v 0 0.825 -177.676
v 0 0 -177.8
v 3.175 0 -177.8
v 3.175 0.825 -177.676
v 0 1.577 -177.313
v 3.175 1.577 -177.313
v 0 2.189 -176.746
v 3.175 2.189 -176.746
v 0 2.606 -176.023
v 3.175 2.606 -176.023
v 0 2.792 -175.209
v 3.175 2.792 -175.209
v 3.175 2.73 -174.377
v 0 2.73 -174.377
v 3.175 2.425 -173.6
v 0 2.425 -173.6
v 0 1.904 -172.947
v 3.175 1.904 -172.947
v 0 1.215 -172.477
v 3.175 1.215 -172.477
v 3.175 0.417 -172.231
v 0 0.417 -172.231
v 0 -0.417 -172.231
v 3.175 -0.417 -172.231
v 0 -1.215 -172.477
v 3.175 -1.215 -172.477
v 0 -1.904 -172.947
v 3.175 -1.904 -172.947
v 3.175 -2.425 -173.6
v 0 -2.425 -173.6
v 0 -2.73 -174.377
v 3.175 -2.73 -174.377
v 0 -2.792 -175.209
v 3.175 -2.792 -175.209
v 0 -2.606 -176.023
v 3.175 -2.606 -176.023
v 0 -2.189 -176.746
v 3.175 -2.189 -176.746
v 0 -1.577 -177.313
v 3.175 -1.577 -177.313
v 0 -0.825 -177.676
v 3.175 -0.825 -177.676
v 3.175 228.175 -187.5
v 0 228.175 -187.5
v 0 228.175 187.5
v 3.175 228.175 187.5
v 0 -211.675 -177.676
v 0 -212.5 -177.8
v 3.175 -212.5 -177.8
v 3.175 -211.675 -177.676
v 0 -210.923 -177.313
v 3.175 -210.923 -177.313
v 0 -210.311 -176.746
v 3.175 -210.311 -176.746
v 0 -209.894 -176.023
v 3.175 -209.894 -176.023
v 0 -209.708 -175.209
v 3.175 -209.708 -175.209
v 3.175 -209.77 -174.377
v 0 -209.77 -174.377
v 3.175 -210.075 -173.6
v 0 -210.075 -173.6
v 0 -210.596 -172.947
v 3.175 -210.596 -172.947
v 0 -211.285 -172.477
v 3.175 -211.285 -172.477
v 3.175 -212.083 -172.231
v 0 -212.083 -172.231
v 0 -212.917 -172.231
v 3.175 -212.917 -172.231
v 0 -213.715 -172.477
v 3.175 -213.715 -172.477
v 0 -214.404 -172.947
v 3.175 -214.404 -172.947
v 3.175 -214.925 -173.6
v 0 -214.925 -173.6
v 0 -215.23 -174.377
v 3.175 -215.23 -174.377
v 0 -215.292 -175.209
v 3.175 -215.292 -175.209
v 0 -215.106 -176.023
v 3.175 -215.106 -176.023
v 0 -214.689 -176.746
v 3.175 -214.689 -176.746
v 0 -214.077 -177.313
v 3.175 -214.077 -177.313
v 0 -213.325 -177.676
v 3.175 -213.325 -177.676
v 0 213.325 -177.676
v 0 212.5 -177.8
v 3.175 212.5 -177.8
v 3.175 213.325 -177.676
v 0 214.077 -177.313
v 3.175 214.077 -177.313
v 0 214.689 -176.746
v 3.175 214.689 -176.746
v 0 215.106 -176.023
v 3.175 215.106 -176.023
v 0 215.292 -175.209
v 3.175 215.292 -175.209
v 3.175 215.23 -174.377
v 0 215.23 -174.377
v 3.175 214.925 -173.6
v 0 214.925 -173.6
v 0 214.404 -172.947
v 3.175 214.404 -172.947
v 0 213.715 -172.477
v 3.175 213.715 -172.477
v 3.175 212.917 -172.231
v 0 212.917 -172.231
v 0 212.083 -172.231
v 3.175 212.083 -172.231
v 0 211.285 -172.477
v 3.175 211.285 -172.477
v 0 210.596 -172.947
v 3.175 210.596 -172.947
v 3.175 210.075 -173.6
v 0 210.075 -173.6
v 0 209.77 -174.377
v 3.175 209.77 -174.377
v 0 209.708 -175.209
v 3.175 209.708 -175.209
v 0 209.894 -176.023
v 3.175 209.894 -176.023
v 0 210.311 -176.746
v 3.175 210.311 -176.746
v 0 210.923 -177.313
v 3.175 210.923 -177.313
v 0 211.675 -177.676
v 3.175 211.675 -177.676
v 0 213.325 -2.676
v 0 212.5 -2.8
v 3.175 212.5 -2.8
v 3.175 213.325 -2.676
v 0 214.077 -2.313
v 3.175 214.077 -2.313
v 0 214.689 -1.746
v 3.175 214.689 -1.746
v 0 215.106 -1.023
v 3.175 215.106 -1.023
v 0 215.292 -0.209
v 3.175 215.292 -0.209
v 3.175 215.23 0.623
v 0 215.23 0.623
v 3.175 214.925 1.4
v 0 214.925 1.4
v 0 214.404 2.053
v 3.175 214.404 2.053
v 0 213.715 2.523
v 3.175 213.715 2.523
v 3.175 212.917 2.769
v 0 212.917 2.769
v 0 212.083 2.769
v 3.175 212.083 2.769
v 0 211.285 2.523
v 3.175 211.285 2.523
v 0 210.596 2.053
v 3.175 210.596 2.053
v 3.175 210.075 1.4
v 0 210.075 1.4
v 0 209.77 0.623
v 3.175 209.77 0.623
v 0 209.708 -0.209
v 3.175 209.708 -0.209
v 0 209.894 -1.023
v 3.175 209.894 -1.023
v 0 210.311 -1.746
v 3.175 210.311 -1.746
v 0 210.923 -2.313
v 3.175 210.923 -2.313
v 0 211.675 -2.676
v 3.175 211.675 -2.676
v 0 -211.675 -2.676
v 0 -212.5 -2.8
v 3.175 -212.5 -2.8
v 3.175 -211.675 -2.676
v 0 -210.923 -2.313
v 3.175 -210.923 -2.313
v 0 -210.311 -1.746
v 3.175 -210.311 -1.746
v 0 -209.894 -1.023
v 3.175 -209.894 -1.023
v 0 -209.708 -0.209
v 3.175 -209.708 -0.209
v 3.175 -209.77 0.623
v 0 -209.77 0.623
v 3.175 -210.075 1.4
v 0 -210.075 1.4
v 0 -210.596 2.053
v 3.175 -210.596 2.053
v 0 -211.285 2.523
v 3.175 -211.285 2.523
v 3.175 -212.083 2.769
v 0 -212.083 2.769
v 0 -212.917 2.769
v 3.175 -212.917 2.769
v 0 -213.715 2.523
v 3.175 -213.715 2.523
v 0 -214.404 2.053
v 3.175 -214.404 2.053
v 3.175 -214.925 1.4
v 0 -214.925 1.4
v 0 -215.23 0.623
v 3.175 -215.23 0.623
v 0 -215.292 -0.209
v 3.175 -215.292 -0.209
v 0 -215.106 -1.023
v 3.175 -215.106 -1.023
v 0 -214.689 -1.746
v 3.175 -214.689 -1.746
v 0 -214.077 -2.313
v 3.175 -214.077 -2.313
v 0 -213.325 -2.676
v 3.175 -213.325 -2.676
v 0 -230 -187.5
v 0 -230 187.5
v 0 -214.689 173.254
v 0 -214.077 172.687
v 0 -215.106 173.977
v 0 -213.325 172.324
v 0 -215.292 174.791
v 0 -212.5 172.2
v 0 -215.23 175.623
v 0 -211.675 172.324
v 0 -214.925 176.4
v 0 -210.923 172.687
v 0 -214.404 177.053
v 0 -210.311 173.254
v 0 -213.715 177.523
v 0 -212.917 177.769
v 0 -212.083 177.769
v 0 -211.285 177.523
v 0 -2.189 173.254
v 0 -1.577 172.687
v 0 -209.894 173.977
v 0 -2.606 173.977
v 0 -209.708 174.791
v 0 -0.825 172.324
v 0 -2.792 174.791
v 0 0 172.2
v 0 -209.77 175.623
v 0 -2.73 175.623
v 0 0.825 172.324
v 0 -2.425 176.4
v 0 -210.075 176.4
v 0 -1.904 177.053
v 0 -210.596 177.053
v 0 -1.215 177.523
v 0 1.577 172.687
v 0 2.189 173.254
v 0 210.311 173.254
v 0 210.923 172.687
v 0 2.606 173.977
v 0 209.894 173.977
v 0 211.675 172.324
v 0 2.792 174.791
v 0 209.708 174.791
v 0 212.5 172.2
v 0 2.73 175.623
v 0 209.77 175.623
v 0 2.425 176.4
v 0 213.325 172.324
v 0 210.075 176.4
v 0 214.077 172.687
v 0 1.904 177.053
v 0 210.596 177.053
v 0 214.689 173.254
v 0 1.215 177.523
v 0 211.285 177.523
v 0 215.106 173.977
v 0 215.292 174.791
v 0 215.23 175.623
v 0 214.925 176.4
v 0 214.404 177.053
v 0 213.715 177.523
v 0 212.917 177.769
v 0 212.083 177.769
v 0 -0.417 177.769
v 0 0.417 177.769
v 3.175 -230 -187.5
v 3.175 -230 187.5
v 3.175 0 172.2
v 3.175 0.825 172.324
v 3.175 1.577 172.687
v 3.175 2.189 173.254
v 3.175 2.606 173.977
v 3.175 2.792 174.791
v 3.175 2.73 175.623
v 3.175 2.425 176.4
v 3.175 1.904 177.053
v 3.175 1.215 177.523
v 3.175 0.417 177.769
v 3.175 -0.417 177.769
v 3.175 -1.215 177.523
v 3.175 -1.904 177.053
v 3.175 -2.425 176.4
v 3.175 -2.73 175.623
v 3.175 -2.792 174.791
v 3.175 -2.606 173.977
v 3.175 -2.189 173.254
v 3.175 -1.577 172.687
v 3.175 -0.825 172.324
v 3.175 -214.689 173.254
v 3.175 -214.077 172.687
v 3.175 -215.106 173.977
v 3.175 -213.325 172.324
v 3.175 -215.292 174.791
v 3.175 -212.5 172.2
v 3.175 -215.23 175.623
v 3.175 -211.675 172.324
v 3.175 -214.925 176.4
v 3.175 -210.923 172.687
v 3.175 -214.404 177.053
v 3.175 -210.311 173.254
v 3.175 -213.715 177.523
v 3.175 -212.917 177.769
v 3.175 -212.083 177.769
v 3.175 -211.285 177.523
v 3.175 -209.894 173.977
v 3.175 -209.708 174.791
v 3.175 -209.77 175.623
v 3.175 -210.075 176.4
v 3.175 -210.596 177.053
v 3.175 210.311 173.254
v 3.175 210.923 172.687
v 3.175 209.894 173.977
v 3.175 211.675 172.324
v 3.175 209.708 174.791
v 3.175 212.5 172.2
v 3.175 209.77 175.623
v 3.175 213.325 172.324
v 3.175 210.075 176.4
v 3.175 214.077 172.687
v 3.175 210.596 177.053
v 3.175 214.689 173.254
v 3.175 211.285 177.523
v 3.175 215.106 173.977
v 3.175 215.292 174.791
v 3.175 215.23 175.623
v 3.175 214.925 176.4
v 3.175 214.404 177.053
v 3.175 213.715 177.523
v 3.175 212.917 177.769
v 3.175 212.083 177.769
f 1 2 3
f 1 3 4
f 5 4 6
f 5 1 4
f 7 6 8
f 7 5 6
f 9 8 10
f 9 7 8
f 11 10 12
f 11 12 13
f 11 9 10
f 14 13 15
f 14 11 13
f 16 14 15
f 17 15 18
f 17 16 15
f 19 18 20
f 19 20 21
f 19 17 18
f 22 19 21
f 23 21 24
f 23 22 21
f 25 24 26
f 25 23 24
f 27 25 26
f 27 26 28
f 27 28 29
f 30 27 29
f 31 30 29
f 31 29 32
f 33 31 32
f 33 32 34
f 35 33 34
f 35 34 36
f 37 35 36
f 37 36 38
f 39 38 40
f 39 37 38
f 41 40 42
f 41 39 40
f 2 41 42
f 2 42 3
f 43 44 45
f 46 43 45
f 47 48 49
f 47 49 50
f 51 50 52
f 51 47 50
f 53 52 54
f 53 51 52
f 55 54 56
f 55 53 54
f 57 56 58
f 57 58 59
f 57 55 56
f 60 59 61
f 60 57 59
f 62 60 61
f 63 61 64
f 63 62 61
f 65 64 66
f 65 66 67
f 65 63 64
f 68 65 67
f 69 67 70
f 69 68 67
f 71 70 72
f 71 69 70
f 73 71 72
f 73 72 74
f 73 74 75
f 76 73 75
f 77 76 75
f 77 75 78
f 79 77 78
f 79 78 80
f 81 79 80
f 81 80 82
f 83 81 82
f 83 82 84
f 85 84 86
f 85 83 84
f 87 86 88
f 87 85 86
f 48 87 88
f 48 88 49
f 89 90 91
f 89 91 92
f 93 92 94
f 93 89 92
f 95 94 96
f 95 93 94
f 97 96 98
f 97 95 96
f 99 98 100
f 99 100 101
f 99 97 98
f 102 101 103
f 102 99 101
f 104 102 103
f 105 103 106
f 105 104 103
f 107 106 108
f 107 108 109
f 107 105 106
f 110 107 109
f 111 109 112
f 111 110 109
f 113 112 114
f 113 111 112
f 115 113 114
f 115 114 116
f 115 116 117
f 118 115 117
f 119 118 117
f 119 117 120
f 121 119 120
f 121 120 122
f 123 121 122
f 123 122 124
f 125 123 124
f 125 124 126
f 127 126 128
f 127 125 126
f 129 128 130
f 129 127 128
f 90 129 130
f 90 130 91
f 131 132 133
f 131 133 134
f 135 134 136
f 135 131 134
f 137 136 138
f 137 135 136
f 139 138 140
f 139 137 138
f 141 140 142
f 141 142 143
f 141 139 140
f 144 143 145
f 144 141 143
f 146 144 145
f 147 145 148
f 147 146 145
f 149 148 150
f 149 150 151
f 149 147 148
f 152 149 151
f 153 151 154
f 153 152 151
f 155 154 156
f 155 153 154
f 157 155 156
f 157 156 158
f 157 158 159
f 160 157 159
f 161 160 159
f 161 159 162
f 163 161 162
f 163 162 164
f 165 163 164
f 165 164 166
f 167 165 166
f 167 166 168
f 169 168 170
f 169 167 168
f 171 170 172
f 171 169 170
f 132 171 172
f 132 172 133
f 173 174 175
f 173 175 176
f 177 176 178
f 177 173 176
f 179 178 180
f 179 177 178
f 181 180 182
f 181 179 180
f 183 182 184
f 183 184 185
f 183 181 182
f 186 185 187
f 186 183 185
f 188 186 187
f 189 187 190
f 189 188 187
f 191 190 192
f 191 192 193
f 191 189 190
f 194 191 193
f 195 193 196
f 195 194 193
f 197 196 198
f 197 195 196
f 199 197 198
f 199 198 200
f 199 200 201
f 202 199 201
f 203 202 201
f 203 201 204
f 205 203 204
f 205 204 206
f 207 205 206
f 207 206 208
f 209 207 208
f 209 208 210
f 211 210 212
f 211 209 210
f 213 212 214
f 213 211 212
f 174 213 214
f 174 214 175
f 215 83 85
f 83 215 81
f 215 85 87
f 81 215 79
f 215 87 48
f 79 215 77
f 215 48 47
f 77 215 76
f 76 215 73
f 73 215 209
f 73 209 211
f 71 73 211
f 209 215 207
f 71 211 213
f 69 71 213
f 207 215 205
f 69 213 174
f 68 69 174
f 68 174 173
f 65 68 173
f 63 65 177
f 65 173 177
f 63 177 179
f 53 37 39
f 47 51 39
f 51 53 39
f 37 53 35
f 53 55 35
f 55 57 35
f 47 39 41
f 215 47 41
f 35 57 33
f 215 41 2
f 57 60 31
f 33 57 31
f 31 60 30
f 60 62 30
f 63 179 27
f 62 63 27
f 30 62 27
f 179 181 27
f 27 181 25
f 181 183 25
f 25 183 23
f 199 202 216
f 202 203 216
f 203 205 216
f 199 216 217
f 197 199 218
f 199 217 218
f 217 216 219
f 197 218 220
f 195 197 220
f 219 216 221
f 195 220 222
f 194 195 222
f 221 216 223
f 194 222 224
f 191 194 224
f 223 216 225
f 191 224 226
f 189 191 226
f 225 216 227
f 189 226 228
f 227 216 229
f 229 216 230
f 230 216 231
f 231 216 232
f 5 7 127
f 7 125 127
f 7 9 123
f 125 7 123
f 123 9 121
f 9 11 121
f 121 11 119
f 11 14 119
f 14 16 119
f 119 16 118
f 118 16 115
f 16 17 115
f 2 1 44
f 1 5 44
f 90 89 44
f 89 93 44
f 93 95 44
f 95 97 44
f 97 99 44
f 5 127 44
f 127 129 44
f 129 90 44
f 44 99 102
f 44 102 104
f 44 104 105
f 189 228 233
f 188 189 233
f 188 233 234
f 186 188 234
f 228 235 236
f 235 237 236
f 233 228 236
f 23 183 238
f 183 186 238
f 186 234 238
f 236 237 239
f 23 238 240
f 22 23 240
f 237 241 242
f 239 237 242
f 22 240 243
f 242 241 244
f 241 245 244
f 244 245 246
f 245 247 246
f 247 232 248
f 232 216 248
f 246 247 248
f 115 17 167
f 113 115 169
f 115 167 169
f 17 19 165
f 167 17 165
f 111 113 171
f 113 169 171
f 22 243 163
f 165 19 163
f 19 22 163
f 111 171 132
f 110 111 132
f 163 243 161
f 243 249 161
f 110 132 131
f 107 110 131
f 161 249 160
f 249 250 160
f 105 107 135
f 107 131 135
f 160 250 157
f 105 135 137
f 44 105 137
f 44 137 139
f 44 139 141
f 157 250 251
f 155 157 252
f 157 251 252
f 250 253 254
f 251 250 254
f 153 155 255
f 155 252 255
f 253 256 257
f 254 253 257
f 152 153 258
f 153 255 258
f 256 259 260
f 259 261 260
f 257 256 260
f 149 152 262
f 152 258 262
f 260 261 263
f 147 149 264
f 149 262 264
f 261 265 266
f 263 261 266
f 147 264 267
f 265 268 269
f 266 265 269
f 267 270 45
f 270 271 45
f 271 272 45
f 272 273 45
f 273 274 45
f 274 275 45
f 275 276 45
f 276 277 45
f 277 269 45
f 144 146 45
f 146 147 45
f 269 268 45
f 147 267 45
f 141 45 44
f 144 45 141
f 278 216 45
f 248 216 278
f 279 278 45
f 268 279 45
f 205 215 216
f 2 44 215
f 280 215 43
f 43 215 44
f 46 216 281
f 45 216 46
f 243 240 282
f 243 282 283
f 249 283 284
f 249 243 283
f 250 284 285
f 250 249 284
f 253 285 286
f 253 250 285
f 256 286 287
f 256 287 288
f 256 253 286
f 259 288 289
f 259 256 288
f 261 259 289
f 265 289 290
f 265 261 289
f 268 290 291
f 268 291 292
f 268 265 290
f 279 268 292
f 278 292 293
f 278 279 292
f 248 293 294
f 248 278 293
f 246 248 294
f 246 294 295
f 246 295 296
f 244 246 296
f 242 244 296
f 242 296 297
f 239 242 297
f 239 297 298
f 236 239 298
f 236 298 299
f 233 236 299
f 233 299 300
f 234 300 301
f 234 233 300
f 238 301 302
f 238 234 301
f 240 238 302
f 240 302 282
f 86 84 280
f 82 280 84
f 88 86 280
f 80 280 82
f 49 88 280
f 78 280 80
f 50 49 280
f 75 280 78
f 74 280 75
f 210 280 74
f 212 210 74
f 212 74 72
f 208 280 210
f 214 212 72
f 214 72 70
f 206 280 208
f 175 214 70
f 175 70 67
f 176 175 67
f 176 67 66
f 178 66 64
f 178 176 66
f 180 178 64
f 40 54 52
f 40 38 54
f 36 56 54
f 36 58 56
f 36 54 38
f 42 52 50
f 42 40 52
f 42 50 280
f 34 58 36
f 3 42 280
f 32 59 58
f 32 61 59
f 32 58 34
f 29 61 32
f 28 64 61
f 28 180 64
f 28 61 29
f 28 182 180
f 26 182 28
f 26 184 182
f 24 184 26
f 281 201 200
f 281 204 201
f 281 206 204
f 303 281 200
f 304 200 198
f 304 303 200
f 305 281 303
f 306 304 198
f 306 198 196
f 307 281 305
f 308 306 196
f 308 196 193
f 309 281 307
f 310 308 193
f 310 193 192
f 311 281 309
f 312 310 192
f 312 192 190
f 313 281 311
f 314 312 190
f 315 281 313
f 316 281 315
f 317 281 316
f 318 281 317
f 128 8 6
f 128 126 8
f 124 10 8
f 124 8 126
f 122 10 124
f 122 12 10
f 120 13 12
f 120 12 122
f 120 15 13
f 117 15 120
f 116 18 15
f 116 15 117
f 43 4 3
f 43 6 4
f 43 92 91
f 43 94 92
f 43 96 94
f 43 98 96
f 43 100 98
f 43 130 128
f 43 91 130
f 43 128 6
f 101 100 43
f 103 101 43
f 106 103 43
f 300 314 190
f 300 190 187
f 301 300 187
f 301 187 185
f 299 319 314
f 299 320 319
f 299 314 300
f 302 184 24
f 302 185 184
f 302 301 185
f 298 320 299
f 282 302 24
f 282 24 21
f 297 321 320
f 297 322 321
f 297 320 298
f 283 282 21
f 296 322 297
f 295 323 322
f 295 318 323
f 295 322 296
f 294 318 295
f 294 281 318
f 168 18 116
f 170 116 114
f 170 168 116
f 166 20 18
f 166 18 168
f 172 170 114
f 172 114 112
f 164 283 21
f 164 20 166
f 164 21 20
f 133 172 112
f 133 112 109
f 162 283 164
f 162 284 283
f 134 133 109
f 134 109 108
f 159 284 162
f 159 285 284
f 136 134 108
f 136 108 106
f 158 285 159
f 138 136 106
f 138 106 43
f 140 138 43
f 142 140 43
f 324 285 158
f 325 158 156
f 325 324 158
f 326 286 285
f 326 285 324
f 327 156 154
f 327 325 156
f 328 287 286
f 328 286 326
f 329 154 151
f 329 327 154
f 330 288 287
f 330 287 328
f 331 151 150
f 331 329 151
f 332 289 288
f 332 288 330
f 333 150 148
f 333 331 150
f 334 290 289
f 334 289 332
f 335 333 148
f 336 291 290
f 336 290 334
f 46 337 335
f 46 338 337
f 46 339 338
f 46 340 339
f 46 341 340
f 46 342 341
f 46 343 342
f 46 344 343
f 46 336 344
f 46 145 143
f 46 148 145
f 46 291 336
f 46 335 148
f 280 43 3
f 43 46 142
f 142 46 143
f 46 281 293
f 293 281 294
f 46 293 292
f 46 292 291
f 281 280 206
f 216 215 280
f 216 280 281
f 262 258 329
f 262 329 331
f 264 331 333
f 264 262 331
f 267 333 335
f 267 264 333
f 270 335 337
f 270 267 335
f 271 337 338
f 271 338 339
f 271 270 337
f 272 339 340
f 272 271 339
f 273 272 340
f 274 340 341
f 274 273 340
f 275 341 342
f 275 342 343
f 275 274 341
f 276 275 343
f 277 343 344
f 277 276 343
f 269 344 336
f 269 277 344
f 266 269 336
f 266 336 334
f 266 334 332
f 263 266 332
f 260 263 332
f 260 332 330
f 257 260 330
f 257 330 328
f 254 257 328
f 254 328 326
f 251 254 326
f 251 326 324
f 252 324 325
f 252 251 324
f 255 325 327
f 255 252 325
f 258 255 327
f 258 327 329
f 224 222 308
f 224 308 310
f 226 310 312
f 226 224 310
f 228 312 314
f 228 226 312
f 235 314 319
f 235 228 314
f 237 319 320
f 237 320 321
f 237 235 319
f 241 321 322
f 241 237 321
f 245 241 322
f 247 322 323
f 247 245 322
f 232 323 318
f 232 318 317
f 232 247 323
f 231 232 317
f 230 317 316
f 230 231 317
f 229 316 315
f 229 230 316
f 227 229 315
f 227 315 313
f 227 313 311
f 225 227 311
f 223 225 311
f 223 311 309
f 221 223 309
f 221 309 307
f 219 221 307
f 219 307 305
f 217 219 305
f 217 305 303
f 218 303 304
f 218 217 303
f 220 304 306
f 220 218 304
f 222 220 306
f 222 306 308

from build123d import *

# Parameters (mm, degrees)
SKETCH1_W           = 5
SKETCH1_H           = 375
SKETCH1_W_2         = 450
SKETCH1_R           = 2.8
SKETCH1_W_3         = 3.175
BOSS_EXTRUDE1_DEPTH = 3.175


with BuildPart() as part:
    # Sketch1 → Boss-Extrude1 (new body)
    # profile 1 of 3: a face of its own
    with BuildSketch(Plane.YZ):
        with Locations((-227.5, 0)):
            Rectangle(SKETCH1_W, SKETCH1_H)
    # profile 2 of 3: a face of its own
    with BuildSketch(Plane.YZ):
        Rectangle(SKETCH1_W_2, SKETCH1_H)
        with Locations(Location((-212.5, 0, 0), (0, 0, 270))):
            Circle(SKETCH1_R, mode=Mode.SUBTRACT)
        with Locations(Location((212.5, 0, 0), (0, 0, 270))):
            Circle(SKETCH1_R, mode=Mode.SUBTRACT)
        with Locations(Location((0, 175, 0), (0, 0, 270))):
            Circle(SKETCH1_R, mode=Mode.SUBTRACT)
        with Locations(Location((0, -175, 0), (0, 0, 270))):
            Circle(SKETCH1_R, mode=Mode.SUBTRACT)
        with Locations(Location((-212.5, -175, 0), (0, 0, 270))):
            Circle(SKETCH1_R, mode=Mode.SUBTRACT)
        with Locations(Location((212.5, -175, 0), (0, 0, 270))):
            Circle(SKETCH1_R, mode=Mode.SUBTRACT)
        with Locations(Location((212.5, 175, 0), (0, 0, 270))):
            Circle(SKETCH1_R, mode=Mode.SUBTRACT)
        with Locations(Location((-212.5, 175, 0), (0, 0, 270))):
            Circle(SKETCH1_R, mode=Mode.SUBTRACT)
    # profile 3 of 3: a face of its own
    with BuildSketch(Plane.YZ):
        with Locations((226.5875, 0)):
            Rectangle(SKETCH1_W_3, SKETCH1_H)
    extrude(amount=BOSS_EXTRUDE1_DEPTH)


solid = part.part
